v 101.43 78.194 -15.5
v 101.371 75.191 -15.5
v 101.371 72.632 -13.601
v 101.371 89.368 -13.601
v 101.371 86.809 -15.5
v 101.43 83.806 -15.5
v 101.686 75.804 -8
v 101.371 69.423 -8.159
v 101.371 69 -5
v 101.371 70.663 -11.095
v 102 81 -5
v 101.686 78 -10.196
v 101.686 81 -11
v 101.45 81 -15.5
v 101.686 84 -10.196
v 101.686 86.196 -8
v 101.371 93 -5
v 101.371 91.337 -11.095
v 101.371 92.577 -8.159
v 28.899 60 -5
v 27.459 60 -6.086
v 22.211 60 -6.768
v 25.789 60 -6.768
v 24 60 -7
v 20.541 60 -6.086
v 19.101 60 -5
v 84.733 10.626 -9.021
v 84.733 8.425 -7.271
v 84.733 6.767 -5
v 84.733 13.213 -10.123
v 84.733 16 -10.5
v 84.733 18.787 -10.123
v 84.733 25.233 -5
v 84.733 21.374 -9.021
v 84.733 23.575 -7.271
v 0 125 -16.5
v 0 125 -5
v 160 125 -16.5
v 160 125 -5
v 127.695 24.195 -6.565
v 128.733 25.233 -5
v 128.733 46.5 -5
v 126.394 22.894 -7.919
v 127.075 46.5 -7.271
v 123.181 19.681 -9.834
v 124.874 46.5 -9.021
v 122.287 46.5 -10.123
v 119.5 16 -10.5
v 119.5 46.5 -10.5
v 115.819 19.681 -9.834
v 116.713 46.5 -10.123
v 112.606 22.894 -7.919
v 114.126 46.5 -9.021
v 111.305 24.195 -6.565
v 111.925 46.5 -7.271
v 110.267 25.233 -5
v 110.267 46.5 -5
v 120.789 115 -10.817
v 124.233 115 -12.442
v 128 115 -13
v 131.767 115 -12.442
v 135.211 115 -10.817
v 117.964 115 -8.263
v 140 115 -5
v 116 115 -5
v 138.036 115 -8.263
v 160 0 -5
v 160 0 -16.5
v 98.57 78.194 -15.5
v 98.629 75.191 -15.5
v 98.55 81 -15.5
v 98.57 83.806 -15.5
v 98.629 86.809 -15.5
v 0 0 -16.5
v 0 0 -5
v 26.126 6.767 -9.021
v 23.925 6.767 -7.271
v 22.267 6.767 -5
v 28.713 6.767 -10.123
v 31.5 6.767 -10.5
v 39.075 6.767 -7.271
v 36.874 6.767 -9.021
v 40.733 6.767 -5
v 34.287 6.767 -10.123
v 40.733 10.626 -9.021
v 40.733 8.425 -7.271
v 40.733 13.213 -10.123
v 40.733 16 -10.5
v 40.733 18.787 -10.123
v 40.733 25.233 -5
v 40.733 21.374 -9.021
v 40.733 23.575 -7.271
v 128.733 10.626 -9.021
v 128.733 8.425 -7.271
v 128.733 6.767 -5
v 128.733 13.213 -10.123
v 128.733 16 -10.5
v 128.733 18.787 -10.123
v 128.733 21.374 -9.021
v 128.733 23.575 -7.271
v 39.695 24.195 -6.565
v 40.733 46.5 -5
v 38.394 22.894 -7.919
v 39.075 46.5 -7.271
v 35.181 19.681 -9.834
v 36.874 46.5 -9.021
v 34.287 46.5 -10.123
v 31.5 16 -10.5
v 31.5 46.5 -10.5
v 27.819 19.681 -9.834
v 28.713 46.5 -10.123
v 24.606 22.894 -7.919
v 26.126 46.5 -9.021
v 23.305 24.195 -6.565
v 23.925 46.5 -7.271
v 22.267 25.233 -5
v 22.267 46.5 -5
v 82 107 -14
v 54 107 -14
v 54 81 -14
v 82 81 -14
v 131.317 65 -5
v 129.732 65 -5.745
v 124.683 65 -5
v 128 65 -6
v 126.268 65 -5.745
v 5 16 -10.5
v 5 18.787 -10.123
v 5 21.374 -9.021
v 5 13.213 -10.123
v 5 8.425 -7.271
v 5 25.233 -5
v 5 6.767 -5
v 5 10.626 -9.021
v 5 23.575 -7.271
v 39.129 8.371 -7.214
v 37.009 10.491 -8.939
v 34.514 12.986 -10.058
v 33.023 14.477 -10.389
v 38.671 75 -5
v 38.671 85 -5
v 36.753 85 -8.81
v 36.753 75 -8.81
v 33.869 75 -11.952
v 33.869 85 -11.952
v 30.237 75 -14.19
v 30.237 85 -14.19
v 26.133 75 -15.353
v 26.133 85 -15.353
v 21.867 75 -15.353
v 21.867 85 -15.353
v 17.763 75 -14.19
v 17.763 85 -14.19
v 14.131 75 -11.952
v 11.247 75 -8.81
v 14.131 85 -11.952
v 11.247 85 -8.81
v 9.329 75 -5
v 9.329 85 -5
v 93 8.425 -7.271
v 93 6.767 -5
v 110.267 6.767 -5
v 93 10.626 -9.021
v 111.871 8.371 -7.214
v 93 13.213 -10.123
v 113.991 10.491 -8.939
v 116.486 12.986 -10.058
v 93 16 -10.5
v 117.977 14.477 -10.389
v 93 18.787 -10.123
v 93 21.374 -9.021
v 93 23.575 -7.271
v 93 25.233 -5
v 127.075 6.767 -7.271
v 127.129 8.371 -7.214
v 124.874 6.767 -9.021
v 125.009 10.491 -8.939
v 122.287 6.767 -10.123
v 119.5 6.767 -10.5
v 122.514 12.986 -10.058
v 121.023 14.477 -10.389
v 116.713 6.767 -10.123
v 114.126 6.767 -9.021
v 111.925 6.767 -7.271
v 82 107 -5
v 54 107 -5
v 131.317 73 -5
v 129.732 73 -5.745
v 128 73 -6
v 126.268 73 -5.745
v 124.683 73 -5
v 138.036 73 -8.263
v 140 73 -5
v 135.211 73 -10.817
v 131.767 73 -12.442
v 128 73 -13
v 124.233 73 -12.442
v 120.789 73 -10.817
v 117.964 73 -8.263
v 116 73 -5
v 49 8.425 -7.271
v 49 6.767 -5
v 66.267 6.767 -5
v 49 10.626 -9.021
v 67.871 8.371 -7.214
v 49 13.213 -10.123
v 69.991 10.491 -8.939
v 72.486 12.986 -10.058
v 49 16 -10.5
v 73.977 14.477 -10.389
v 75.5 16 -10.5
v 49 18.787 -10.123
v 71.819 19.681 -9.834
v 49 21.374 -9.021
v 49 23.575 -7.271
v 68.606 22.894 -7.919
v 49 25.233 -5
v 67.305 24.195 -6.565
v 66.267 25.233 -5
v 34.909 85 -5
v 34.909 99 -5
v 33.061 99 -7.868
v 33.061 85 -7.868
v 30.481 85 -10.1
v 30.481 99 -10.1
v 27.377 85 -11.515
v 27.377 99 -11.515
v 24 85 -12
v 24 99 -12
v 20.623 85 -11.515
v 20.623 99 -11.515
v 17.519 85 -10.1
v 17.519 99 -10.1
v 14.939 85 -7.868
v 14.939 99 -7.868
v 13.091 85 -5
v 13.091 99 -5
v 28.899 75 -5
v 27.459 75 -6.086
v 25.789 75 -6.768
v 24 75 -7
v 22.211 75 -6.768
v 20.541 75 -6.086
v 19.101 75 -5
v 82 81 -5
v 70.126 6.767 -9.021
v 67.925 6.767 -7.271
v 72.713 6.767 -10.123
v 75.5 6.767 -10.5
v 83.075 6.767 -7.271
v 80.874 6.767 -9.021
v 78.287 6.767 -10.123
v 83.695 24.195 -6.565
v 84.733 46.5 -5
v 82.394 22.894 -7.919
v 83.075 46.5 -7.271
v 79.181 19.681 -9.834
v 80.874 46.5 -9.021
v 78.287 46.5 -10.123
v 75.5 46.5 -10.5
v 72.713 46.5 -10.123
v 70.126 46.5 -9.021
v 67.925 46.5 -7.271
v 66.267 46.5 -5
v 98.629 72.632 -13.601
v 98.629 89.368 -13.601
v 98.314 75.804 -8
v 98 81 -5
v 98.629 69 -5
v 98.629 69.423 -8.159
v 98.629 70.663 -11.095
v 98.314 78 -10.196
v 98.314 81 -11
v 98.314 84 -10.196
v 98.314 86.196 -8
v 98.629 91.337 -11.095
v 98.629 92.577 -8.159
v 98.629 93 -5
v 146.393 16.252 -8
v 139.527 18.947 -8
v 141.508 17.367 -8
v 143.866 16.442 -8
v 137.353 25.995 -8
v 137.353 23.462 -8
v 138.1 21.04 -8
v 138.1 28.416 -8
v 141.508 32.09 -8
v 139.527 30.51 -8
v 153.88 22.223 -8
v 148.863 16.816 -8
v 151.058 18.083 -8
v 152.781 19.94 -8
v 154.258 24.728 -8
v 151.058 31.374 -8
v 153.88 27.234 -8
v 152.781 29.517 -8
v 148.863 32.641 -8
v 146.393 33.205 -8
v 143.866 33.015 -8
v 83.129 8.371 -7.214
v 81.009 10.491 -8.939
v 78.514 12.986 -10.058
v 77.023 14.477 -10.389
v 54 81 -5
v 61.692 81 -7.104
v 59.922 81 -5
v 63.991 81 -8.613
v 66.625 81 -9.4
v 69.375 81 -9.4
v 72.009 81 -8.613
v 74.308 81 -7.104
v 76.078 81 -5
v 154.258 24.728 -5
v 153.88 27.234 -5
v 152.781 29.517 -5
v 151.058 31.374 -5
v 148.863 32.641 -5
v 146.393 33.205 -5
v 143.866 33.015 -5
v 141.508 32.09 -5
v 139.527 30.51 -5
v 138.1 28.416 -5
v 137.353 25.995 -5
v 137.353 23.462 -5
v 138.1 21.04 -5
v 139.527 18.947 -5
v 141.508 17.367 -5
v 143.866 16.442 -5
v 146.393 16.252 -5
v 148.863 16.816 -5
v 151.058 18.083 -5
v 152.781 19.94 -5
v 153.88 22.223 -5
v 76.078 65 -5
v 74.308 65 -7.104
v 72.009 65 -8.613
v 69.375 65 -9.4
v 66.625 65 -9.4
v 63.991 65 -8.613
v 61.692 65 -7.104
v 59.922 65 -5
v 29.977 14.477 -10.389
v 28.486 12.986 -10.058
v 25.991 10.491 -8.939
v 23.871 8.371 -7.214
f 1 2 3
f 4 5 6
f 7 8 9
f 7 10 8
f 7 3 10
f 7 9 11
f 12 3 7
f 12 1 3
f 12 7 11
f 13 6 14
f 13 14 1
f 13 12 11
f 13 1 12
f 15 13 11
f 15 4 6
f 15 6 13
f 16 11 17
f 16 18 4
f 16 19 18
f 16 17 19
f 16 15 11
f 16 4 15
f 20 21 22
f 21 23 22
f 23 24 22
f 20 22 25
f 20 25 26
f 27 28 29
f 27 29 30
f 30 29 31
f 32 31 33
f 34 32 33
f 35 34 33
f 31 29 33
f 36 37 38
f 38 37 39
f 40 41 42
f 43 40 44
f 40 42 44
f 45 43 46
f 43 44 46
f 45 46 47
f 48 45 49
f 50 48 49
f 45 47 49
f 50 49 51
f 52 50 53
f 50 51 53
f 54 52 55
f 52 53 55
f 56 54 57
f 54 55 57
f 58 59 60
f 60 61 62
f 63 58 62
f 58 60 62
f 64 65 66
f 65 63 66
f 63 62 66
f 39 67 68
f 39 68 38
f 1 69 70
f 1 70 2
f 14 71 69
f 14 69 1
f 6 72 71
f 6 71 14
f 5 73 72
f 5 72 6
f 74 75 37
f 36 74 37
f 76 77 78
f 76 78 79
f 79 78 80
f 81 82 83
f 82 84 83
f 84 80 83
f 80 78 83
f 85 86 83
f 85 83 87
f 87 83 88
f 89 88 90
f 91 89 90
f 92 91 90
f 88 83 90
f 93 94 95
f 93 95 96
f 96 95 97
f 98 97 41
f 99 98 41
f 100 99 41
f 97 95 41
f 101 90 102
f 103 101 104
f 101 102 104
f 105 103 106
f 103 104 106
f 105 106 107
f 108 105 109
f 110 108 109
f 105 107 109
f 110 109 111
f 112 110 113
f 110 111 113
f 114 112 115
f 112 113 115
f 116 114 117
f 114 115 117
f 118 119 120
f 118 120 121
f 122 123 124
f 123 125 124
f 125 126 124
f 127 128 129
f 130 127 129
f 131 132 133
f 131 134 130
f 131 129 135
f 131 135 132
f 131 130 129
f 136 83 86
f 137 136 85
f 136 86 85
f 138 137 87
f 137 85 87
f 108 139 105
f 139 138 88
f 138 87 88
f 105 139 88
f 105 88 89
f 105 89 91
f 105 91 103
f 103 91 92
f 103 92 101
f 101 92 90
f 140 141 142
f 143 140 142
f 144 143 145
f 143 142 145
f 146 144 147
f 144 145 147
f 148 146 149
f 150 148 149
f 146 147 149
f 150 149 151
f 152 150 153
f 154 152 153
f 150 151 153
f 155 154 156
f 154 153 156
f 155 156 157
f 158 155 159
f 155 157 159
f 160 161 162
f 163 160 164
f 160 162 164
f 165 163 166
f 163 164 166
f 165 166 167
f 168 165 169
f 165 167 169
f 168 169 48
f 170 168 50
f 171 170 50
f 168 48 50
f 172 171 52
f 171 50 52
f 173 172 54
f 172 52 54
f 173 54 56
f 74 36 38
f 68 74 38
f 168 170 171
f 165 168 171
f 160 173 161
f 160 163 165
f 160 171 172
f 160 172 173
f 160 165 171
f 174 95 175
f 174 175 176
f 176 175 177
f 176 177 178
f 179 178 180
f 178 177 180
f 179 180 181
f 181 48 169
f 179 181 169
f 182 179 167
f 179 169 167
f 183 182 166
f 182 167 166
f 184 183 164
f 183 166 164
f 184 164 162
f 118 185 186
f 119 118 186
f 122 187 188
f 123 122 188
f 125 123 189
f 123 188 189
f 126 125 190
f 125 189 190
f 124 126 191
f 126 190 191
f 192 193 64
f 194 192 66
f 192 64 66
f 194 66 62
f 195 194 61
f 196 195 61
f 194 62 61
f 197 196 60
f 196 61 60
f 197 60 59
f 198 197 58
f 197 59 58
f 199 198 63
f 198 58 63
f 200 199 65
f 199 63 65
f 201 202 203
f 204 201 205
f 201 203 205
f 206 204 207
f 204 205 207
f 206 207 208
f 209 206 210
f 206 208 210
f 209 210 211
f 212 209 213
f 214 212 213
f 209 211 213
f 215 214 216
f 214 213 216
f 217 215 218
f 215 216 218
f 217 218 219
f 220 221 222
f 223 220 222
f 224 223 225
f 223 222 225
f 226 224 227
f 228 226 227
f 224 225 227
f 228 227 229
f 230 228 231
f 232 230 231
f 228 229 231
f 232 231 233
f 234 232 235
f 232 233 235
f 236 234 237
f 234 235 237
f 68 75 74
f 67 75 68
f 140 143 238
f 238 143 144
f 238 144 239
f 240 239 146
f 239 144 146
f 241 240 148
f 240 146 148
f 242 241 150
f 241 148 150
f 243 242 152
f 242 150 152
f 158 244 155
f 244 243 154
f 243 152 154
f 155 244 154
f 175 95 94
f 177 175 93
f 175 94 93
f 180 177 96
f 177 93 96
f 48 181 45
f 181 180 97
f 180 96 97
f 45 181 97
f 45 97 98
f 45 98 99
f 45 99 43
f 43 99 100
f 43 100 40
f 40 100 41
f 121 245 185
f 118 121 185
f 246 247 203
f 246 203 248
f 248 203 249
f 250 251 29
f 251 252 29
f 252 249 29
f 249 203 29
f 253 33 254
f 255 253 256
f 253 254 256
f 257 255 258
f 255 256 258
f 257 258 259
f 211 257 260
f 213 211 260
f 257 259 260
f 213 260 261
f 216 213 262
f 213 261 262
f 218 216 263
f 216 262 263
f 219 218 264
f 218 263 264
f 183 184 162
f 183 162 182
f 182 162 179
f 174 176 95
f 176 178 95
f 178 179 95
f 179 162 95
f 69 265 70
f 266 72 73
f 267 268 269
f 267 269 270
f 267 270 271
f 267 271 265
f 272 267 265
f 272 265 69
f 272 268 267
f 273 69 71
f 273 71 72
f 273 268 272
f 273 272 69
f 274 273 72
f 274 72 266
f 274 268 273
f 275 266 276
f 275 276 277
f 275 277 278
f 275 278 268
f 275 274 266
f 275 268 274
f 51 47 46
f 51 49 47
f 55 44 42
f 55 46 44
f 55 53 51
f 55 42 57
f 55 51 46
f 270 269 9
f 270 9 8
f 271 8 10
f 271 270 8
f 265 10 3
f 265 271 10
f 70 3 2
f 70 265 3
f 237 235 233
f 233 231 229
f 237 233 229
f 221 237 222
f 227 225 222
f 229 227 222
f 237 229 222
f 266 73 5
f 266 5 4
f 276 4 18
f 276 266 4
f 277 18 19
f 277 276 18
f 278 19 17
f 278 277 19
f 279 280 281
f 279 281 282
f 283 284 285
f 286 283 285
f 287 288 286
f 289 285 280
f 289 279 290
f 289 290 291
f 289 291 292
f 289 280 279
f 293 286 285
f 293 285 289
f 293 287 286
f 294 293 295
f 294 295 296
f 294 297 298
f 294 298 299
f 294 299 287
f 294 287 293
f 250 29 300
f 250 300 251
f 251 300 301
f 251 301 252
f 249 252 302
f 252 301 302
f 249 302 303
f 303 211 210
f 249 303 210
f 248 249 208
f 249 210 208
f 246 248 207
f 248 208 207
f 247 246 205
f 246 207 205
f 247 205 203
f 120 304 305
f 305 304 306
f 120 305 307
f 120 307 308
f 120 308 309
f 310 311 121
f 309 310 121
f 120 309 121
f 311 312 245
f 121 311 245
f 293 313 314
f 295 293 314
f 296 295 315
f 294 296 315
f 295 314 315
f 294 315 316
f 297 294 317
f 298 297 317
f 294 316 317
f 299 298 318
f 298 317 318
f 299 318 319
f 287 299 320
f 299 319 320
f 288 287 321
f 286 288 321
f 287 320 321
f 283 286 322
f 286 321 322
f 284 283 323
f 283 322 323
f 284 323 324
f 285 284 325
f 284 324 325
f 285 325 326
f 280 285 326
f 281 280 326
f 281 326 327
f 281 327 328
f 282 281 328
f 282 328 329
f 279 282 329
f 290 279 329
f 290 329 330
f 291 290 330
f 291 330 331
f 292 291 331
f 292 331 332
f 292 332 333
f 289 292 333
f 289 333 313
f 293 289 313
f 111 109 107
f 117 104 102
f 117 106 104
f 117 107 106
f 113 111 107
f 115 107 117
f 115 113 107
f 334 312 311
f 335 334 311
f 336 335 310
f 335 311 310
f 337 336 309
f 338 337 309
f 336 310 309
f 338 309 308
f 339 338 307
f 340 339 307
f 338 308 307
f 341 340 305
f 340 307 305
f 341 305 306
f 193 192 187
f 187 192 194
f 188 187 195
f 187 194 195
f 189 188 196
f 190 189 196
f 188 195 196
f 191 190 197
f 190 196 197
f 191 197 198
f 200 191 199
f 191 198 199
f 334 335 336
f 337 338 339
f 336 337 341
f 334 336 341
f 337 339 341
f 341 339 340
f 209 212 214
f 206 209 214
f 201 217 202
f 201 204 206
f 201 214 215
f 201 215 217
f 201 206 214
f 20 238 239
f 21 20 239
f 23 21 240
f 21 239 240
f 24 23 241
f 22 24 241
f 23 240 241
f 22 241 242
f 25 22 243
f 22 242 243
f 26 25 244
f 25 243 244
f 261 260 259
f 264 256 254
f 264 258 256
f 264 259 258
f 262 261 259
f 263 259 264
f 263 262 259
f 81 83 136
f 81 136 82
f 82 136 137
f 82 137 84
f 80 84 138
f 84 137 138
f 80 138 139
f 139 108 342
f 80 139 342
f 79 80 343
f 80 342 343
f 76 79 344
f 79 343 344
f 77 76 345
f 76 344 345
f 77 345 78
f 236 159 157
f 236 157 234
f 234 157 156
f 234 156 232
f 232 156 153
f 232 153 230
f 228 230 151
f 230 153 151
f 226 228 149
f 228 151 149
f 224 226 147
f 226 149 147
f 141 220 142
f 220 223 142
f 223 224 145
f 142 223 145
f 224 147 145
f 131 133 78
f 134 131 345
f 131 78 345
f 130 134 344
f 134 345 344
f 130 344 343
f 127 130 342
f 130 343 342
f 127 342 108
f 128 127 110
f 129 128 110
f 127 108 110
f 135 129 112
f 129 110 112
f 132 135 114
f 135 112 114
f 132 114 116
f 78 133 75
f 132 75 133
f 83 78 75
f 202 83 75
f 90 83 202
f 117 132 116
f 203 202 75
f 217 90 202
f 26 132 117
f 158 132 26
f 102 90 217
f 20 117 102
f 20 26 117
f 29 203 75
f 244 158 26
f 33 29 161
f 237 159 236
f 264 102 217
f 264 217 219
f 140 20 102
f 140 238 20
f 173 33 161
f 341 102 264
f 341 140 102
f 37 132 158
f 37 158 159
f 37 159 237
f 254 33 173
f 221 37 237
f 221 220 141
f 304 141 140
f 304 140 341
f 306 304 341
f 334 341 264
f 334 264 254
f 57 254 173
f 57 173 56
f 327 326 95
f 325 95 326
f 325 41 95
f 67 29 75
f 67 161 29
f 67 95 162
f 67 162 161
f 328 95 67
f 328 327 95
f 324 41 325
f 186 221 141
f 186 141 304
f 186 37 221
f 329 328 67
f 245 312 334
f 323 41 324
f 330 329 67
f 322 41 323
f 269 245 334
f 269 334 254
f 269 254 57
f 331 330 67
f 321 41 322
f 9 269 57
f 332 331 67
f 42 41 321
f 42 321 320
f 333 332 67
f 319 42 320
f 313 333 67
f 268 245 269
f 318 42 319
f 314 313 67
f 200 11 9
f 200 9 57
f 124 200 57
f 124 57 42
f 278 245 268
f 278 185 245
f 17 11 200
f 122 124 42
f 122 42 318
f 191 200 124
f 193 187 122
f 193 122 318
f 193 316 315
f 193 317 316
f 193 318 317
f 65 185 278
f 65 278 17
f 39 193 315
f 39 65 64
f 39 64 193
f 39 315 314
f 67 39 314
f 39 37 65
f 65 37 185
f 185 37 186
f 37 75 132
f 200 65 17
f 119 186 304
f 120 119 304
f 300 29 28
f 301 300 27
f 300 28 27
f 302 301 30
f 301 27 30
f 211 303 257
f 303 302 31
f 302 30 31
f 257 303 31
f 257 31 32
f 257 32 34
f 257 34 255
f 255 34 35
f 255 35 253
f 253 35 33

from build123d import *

# Parameters (mm, degrees)
F0_W      = 160
F0_H      = 125
F1_DEPTH  = 16.5
F2_W      = 37
F2_H      = 10.5
F4_W      = 10.5
F4_H      = 41
F6_W      = 10.5
F6_H      = 41
F8_W      = 10.5
F8_H      = 41
F10_R     = 8.5
F11_DEPTH = 8
F14_W     = 9.5
F14_H     = 16
F17_DEPTH = 14
F20_W     = 160
F20_H     = 5
F21_DEPTH = 150
F24_W     = 18.4661853126
F24_H     = 1.2669073437
F24_W_2   = 1.2669073437
F24_H_2   = 18.4661853126
F25_DEPTH = 10
F27_START = -10.5
F27_DEPTH = 1


with BuildPart() as f1:
    # F0 (on Top) → F1 (new body)
    with BuildSketch(Plane.XY):
        with Locations((80, 62.5)):
            Rectangle(F0_W, F0_H)
    extrude(amount=-F1_DEPTH)

    # F2 (on face) → F3 (revolve, cut)
    with BuildSketch(Plane.XY):
        with Locations((23.5, 10.75)):
            Rectangle(F2_W, F2_H)
        with Locations((67.5, 10.75)):
            Rectangle(F2_W, F2_H)
        with Locations((111.5, 10.75)):
            Rectangle(F2_W, F2_H)
    revolve(axis=Axis((23.5, 16, 0), (1, 0, 0)), mode=Mode.SUBTRACT)

    # F4 (on face) → F5 (revolve, cut)
    with BuildSketch(Plane.XY):
        with Locations((36.75, 26)):
            Rectangle(F4_W, F4_H)
    revolve(axis=Axis((31.5, 26, 0), (0, 1, 0)), mode=Mode.SUBTRACT)

    # F6 (on face) → F7 (revolve, cut)
    with BuildSketch(Plane.XY):
        with Locations((80.75, 26)):
            Rectangle(F6_W, F6_H)
    revolve(axis=Axis((75.5, 26, 0), (0, 1, 0)), mode=Mode.SUBTRACT)

    # F8 (on face) → F9 (revolve, cut)
    with BuildSketch(Plane.XY):
        with Locations((124.75, 26)):
            Rectangle(F8_W, F8_H)
    revolve(axis=Axis((119.5, 26, 0), (0, 1, 0)), mode=Mode.SUBTRACT)

    # F10 (on face) → F11 (cut)
    with BuildSketch(Plane.XY):
        with Locations((145.7579010625, 24.7283919918)):
            Circle(F10_R)
    extrude(amount=-F11_DEPTH, mode=Mode.SUBTRACT)

    # F12 (on face) → F13 (revolve, cut)
    with BuildSketch(Plane.XY):
        Polygon((24, 75), (24, 60), (31, 60), (31, 75), (39.5, 75), (39.5, 85), (36, 85), (36, 99), (28.5, 99), (28.5, 113), (24, 113), (24, 99), (24, 85), align=None)
    revolve(axis=Axis((24, 92, 0), (0, 1, 0)), mode=Mode.SUBTRACT)

    # F14 (on face) → F15 (revolve, cut)
    with BuildSketch(Plane.XY):
        with Locations((72.75, 73)):
            Rectangle(F14_W, F14_H)
    revolve(axis=Axis((68, 73, 0), (0, 1, 0)), mode=Mode.SUBTRACT)

    # F16 (on face) → F17 (cut)
    with BuildSketch(Plane.XY):
        Polygon((54, 107), (54, 81), (58.5, 81), (77.5, 81), (82, 81), (82, 107), align=None)
    extrude(amount=-F17_DEPTH, mode=Mode.SUBTRACT)

    # F18 (on face) → F19 (revolve, cut)
    with BuildSketch(Plane.XY):
        Polygon((128, 73), (128, 65), (134, 65), (134, 73), (141, 73), (141, 115), (128, 115), align=None)
    revolve(axis=Axis((128, 94, 0), (0, 1, 0)), mode=Mode.SUBTRACT)

    # F20 (on Front) → F21 (cut)
    with BuildSketch(Plane.XZ):
        with Locations((80, -2.5)):
            Rectangle(F20_W, F20_H)
    extrude(amount=-F21_DEPTH, mode=Mode.SUBTRACT)

    # F22 (on face) → F23 (revolve, cut)
    with BuildSketch(Plane.XY.offset(-5)):
        Polygon((98.6288933514, 93), (98, 81), (102, 81), (101.3711066486, 93), align=None)
    revolve(axis=Axis((100, 81, -5), (1, 0, 0)), mode=Mode.SUBTRACT)

    # F24 (on face) → F25 (join)
    with BuildSketch(Plane.XY.offset(-5)):
        with Locations((31.5, 6.1334536718)):
            Rectangle(F24_W, F24_H)
        with Locations((41.3665463282, 16)):
            Rectangle(F24_W_2, F24_H_2)
        with Locations((85.3665463282, 16)):
            Rectangle(F24_W_2, F24_H_2)
        with Locations((75.5, 6.1334536718)):
            Rectangle(F24_W, F24_H)
        with Locations((129.3665463282, 16)):
            Rectangle(F24_W_2, F24_H_2)
        with Locations((119.5, 6.1334536718)):
            Rectangle(F24_W, F24_H)
    extrude(amount=-F25_DEPTH)

    # F26 (on face) → F27 (join)
    with BuildSketch(Plane.XY.offset(-5).offset(F27_START)):
        Polygon((101.528329799, 90.0000035763), (98.471670201, 90.0000035763), (98, 81), (98.3558213304, 74.210524559), (101.6441786696, 74.210524559), (102, 81), align=None)
    extrude(amount=-F27_DEPTH)


solid = f1.part
